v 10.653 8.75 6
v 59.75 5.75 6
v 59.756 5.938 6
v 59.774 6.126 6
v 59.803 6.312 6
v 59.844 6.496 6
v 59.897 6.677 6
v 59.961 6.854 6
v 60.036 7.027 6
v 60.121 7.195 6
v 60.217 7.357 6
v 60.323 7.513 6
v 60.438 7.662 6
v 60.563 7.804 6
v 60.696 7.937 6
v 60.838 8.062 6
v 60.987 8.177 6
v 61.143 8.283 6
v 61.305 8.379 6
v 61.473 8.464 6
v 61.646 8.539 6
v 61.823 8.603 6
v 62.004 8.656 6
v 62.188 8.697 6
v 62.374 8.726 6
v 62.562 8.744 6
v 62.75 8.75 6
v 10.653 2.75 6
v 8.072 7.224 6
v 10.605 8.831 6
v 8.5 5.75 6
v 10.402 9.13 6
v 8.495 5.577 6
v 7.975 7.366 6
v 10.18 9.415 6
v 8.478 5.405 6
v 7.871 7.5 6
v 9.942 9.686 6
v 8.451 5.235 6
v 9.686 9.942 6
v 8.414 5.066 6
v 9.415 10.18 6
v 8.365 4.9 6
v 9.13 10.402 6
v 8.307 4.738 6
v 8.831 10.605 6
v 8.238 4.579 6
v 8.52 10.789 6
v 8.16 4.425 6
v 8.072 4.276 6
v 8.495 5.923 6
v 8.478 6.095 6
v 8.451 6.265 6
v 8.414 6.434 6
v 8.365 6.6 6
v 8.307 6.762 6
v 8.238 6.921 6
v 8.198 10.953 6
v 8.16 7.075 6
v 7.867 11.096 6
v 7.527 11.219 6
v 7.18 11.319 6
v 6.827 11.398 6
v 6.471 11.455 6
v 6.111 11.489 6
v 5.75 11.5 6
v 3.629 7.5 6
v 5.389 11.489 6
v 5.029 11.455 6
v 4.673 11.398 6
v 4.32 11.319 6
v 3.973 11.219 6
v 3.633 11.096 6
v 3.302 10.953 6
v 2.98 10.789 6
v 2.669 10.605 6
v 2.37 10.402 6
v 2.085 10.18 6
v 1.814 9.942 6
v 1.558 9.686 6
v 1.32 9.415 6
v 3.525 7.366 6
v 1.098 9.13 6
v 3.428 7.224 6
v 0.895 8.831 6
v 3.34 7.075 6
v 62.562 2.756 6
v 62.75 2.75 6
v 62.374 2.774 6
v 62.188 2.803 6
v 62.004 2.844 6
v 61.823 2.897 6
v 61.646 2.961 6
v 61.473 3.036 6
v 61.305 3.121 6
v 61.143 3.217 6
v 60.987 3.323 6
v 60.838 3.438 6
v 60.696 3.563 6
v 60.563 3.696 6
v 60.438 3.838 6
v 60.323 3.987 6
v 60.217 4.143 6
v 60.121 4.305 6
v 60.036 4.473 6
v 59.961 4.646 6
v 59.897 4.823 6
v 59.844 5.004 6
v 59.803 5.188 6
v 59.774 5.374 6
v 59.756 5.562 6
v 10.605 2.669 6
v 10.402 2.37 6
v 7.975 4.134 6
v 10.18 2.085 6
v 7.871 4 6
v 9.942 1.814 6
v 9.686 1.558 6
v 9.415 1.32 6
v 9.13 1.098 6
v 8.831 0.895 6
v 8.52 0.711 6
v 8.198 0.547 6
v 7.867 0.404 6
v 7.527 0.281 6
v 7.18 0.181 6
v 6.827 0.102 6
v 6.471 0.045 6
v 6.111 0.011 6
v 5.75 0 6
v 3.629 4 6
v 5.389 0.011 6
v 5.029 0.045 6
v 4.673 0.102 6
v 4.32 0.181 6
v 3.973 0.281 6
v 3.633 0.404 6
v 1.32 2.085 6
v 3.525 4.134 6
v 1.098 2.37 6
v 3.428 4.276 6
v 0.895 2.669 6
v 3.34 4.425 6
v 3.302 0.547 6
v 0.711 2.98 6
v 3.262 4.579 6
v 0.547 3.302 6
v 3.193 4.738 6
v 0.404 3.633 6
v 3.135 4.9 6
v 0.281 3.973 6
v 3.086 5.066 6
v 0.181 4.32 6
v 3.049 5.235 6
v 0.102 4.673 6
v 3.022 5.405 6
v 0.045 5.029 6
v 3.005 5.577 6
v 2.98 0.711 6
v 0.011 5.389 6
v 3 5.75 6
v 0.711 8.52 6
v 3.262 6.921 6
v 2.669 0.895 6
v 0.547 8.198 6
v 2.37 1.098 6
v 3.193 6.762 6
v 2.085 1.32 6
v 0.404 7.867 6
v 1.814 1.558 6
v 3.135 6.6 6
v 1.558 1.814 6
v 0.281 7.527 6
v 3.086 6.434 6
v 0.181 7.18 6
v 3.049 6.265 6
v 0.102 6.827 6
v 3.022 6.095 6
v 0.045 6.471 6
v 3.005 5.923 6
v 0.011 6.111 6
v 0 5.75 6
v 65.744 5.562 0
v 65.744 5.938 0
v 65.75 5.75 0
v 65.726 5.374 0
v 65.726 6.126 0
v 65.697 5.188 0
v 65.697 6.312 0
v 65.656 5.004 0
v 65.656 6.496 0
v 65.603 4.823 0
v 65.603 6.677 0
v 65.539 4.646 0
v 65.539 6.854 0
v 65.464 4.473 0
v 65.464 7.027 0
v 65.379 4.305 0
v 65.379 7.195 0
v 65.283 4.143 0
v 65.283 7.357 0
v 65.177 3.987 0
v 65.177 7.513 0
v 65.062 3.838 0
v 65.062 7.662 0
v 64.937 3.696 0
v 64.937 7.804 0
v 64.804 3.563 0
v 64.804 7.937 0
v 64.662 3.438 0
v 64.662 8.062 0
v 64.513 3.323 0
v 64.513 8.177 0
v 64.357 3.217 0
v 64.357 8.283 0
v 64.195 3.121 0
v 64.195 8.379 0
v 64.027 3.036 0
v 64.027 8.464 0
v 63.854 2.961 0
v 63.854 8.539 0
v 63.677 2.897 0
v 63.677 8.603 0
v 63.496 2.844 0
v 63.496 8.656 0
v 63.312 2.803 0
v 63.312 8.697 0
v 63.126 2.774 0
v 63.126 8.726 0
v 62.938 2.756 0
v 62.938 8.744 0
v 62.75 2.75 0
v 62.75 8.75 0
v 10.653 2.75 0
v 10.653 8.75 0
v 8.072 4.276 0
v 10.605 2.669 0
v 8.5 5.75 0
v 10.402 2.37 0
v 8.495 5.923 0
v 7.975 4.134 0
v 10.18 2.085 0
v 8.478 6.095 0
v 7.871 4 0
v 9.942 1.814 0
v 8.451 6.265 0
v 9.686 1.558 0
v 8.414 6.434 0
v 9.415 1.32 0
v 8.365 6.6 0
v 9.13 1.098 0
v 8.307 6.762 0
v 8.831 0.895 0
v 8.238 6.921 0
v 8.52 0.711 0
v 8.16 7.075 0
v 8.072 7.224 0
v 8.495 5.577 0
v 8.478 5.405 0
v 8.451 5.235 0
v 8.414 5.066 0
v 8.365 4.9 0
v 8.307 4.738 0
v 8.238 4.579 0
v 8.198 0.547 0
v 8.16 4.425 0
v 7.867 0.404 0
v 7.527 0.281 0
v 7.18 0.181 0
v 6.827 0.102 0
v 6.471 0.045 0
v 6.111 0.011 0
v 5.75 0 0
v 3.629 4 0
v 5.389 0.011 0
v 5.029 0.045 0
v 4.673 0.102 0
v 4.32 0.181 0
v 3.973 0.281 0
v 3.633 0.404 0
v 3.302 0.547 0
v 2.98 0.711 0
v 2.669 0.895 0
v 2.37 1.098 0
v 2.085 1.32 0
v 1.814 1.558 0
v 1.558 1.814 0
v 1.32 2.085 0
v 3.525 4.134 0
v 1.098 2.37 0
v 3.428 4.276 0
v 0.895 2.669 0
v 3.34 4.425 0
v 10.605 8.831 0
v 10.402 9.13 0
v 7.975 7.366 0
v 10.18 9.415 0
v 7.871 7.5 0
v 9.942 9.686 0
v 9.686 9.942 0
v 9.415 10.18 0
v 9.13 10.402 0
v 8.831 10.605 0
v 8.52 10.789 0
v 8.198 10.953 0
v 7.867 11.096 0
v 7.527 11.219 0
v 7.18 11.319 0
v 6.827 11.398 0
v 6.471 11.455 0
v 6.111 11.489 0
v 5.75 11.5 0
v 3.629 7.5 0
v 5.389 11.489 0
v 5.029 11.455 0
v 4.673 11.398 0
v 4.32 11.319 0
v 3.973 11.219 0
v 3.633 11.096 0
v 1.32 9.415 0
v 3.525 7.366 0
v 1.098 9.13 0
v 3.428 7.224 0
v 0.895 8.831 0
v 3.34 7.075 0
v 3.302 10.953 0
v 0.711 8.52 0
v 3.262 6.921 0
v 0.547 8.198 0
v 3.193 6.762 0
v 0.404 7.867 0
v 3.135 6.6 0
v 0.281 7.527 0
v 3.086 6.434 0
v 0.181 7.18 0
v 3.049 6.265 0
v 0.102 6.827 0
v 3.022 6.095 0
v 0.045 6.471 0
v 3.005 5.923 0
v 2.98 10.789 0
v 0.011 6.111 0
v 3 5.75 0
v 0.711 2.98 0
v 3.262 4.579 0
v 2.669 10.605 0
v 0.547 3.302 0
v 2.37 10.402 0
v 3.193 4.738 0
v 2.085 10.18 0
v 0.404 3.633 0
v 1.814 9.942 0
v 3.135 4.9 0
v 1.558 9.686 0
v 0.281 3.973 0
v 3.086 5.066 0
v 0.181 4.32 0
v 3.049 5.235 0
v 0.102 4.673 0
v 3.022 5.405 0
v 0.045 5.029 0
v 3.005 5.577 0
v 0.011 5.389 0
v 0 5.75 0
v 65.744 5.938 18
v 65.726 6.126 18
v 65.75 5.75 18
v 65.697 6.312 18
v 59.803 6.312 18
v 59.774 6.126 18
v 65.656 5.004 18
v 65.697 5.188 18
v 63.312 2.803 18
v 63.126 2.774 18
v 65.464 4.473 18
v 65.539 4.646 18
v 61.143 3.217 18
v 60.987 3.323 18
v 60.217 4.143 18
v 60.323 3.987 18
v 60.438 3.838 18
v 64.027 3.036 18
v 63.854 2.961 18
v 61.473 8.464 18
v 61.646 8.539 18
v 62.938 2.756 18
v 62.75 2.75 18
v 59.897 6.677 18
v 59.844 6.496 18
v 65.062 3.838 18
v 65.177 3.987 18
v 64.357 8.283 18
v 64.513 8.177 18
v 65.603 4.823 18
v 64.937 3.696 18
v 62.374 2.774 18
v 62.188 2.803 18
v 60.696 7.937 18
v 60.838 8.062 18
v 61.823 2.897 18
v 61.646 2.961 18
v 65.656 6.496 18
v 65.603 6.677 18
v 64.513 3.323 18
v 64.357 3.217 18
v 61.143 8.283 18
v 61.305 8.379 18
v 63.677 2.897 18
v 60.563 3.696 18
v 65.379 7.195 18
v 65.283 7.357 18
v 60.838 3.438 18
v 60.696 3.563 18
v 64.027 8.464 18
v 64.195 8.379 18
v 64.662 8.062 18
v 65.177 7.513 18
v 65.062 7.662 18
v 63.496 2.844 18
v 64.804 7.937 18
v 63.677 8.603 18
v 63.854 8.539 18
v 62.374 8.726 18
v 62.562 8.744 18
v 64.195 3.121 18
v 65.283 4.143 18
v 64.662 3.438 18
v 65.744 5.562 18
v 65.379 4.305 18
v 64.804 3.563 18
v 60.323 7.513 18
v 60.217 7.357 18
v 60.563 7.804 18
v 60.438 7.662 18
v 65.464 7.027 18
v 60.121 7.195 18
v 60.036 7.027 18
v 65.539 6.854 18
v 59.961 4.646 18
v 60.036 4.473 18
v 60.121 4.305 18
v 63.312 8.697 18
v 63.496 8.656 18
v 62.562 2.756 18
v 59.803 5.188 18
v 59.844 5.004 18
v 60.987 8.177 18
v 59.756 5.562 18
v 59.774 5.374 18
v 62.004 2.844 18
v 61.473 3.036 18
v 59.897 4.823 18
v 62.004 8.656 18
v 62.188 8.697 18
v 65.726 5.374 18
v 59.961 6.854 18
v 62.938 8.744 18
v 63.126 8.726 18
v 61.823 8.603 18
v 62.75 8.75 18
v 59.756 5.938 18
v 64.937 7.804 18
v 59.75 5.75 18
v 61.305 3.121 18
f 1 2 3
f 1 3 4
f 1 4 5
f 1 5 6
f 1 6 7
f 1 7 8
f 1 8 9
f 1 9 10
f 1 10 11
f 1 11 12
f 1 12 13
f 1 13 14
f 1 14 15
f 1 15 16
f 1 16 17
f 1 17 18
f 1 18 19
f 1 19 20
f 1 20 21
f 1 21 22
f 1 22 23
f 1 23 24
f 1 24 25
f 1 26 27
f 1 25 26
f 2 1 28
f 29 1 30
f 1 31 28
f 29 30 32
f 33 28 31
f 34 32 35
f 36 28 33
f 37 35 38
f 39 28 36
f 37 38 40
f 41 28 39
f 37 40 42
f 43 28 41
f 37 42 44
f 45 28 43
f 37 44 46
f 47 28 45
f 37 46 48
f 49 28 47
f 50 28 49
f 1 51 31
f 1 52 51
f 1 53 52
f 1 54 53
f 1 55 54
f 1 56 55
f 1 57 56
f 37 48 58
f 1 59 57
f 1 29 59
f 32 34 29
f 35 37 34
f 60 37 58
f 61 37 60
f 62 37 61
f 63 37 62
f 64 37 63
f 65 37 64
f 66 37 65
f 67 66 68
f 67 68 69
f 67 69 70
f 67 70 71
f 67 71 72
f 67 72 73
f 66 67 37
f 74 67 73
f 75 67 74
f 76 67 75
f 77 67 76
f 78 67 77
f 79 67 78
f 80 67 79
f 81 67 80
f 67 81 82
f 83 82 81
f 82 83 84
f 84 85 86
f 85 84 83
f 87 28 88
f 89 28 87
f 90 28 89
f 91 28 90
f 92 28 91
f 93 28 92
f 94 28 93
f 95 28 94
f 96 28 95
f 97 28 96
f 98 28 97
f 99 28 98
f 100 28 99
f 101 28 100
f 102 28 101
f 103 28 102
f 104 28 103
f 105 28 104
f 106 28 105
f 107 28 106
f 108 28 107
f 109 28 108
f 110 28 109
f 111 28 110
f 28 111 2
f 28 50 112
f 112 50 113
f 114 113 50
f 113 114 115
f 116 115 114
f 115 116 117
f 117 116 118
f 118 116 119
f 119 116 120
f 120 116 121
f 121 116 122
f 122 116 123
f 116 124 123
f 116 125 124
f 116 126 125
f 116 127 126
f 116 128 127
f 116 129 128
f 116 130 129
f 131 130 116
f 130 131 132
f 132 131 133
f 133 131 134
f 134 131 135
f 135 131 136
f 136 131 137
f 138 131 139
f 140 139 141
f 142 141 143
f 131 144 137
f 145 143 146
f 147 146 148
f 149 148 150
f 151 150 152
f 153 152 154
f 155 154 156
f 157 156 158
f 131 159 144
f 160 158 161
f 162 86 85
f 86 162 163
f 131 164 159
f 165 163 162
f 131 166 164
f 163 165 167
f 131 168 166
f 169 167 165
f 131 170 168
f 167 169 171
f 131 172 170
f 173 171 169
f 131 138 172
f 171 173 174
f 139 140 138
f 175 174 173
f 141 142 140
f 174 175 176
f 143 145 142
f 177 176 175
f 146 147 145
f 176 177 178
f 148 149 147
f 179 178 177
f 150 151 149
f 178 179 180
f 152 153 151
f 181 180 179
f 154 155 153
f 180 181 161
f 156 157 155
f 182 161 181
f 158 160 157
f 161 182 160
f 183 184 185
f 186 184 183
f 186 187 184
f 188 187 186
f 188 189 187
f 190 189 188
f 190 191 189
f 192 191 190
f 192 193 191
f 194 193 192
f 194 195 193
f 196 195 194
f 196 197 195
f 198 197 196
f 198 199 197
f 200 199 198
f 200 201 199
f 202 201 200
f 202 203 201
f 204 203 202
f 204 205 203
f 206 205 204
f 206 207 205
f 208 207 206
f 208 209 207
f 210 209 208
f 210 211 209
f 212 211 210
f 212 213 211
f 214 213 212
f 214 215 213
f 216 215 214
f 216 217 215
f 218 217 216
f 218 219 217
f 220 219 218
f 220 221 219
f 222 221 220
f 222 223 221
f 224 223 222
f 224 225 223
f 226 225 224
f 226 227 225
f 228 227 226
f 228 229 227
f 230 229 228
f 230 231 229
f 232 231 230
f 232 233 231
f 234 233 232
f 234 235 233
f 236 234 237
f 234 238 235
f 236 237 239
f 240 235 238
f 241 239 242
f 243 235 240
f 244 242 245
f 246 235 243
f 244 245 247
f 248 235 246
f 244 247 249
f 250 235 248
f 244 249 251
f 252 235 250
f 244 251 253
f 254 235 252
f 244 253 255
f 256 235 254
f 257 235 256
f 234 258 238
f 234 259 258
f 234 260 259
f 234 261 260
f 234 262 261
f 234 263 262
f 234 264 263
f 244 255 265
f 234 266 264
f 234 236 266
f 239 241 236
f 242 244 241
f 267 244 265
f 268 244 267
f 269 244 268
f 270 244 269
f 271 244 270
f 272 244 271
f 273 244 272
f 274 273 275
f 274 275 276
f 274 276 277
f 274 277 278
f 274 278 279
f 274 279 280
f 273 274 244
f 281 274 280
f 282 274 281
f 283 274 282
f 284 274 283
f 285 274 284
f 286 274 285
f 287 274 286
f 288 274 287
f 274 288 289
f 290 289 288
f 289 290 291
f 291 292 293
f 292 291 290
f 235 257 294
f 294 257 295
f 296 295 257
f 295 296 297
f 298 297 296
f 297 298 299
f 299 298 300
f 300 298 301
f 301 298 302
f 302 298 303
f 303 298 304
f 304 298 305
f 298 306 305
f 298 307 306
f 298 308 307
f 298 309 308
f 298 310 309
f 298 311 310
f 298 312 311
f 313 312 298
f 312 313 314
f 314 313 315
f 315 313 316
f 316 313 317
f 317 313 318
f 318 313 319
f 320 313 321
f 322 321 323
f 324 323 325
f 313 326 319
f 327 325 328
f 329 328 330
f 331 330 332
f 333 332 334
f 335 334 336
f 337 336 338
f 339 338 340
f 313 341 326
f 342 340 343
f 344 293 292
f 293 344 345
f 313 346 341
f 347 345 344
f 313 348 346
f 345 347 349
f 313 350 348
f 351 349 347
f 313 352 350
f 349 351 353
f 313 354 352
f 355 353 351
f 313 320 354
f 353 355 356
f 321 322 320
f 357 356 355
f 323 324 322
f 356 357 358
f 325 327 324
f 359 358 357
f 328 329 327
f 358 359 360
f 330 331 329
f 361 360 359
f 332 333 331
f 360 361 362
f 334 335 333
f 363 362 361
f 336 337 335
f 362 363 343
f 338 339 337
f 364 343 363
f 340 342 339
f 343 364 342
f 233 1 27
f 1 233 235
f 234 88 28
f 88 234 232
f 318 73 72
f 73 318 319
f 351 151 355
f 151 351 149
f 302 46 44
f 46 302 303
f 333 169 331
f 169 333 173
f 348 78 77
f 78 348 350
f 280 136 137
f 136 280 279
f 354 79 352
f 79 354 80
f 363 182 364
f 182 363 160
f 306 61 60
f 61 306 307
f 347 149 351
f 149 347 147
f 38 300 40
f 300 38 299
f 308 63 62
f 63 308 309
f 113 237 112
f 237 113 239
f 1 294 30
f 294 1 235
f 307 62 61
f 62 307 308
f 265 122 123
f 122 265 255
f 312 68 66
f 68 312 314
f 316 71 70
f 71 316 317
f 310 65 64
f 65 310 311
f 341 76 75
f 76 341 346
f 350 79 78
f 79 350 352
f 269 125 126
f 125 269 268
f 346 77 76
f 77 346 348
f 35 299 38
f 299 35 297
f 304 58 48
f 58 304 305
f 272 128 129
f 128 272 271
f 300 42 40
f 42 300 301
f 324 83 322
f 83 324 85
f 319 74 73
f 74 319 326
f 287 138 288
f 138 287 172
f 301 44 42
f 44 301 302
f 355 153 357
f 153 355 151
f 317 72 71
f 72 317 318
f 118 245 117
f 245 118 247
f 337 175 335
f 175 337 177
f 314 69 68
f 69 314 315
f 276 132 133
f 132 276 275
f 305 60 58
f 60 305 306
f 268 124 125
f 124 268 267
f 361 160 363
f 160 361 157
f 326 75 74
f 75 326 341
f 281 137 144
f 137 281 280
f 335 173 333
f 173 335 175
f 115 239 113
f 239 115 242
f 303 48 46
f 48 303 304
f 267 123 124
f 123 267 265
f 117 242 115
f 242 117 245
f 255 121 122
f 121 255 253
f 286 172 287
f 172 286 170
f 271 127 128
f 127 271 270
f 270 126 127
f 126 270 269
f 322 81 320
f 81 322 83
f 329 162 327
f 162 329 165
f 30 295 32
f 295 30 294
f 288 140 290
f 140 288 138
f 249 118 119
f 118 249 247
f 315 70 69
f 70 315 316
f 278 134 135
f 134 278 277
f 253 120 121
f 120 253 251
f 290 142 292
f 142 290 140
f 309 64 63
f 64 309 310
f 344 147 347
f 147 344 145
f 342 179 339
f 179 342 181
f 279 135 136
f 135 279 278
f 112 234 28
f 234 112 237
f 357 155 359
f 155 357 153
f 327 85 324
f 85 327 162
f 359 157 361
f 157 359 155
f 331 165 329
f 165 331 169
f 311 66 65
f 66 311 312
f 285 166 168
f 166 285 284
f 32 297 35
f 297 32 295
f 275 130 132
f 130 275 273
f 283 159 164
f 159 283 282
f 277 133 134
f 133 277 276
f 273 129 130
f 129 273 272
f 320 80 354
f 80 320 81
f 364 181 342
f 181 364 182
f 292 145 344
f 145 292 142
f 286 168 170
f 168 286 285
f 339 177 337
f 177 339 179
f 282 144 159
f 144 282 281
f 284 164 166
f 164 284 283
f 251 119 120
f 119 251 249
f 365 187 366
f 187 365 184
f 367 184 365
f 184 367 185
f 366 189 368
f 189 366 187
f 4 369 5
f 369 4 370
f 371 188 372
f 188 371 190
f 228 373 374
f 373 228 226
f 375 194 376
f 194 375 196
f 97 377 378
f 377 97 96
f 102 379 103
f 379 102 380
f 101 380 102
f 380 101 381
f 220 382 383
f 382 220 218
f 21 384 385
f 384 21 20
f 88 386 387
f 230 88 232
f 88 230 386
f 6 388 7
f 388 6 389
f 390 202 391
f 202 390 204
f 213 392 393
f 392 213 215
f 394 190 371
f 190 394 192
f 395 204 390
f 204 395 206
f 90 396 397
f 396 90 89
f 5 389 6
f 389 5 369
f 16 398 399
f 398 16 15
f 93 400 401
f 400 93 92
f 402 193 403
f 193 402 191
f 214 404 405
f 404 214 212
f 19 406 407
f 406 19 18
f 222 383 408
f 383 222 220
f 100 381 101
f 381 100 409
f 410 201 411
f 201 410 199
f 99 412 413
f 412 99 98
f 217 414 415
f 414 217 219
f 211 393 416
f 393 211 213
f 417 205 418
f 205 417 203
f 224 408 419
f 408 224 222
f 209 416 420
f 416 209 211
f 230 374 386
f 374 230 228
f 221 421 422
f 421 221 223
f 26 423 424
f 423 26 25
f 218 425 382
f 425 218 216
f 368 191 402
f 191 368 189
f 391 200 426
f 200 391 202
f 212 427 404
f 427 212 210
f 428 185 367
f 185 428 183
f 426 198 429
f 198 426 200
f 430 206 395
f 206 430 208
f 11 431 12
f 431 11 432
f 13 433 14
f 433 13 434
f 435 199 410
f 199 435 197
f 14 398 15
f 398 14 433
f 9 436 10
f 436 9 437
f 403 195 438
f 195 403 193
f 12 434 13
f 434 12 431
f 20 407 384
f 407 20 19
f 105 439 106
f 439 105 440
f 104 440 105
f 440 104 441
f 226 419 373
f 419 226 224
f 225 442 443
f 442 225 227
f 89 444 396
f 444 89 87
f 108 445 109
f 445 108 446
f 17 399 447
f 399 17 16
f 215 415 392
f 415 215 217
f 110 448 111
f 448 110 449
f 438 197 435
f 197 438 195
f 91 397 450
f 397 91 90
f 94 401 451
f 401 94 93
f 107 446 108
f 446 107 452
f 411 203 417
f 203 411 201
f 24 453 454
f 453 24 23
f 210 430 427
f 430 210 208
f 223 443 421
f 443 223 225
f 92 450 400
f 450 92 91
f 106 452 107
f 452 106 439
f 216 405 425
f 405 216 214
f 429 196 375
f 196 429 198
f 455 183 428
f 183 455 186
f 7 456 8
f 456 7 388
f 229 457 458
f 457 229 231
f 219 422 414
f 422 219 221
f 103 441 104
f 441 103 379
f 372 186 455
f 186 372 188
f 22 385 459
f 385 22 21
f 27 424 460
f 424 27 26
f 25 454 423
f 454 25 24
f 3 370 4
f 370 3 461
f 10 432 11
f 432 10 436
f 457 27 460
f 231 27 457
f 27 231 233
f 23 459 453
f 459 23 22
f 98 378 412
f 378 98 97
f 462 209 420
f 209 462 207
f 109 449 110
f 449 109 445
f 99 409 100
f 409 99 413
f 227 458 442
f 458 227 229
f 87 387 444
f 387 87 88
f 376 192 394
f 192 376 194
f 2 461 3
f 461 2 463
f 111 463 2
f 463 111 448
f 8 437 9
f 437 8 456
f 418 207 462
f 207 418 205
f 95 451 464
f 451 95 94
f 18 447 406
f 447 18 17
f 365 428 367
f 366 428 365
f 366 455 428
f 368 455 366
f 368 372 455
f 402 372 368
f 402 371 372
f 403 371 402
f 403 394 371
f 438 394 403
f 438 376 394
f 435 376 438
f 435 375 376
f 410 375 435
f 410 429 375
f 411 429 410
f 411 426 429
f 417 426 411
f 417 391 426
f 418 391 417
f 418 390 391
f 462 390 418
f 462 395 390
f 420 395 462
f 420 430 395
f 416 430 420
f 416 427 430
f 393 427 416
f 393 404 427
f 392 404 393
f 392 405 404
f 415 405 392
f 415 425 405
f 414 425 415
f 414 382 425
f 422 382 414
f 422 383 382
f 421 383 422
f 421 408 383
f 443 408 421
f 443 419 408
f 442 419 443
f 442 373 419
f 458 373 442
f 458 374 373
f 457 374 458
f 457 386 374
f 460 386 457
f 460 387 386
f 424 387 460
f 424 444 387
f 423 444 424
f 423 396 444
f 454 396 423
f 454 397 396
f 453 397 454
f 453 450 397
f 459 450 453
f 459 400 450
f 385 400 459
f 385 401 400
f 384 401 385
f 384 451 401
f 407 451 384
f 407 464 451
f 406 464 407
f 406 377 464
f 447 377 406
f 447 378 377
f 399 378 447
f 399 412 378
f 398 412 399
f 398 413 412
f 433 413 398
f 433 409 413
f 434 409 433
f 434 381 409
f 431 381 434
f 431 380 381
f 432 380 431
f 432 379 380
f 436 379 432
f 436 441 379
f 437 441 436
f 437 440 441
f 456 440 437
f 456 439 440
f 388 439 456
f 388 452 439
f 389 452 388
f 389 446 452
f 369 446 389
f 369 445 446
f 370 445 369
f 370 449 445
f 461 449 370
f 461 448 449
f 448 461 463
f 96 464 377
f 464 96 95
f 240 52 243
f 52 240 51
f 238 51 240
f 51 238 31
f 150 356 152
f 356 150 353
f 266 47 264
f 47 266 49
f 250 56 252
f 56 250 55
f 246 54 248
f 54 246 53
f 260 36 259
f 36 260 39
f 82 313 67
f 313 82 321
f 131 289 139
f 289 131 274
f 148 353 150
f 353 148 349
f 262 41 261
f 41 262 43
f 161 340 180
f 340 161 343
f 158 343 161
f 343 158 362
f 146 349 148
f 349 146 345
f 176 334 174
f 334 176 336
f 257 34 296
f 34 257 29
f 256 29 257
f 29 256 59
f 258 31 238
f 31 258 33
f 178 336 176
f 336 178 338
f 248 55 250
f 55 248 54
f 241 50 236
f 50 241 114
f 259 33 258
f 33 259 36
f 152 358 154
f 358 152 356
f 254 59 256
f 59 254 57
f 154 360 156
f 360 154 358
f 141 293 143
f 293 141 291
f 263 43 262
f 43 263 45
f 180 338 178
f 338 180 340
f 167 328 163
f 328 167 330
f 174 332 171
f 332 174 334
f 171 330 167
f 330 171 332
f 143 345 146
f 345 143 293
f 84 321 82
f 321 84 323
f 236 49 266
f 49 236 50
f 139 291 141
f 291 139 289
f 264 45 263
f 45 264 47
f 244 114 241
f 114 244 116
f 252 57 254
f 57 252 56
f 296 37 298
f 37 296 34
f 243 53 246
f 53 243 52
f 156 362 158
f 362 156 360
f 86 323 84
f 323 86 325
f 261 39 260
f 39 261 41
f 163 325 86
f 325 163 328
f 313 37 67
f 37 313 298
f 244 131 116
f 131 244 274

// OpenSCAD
// Daniel Seijas Iglesias <seijasdeveloper@gmail.com>
// palanca motor

$fn = 100;

eje_largo = 6.3;
eje_ancho = 3.5;
eje_diametro = 5.5;

grosor = 6;
largo = 60;

extra_motor = 2;

difference(){
    union(){
        // palo
        translate([(eje_diametro+grosor)/2-grosor/2, (eje_diametro+grosor)/2-grosor/2, 0])
            cube([largo, grosor, grosor]);
        
        translate([(eje_diametro+grosor)/2, (eje_diametro+grosor)/2, 0])
            cylinder(d=eje_diametro+grosor, h=grosor);
        
        translate([largo+(eje_diametro+grosor)/2-grosor/2, (eje_diametro+grosor)/2, 0])
            cylinder(d=grosor, h=grosor*3);
    }
    
    translate([(eje_diametro+grosor)/2, (eje_diametro+grosor)/2, -0.05])
        difference(){
            // eje
            cylinder(d=eje_diametro, h=eje_largo);
            
            // resta positiva
            translate([-eje_diametro/2, eje_ancho/2, -0.05])
                cube([eje_diametro, eje_diametro, eje_largo+0.1]);
            
            // resta negativa
            translate([-eje_diametro/2, -eje_diametro-eje_ancho/2, -0.05])
                cube([eje_diametro, eje_diametro, eje_largo+0.1]);
        }
}
